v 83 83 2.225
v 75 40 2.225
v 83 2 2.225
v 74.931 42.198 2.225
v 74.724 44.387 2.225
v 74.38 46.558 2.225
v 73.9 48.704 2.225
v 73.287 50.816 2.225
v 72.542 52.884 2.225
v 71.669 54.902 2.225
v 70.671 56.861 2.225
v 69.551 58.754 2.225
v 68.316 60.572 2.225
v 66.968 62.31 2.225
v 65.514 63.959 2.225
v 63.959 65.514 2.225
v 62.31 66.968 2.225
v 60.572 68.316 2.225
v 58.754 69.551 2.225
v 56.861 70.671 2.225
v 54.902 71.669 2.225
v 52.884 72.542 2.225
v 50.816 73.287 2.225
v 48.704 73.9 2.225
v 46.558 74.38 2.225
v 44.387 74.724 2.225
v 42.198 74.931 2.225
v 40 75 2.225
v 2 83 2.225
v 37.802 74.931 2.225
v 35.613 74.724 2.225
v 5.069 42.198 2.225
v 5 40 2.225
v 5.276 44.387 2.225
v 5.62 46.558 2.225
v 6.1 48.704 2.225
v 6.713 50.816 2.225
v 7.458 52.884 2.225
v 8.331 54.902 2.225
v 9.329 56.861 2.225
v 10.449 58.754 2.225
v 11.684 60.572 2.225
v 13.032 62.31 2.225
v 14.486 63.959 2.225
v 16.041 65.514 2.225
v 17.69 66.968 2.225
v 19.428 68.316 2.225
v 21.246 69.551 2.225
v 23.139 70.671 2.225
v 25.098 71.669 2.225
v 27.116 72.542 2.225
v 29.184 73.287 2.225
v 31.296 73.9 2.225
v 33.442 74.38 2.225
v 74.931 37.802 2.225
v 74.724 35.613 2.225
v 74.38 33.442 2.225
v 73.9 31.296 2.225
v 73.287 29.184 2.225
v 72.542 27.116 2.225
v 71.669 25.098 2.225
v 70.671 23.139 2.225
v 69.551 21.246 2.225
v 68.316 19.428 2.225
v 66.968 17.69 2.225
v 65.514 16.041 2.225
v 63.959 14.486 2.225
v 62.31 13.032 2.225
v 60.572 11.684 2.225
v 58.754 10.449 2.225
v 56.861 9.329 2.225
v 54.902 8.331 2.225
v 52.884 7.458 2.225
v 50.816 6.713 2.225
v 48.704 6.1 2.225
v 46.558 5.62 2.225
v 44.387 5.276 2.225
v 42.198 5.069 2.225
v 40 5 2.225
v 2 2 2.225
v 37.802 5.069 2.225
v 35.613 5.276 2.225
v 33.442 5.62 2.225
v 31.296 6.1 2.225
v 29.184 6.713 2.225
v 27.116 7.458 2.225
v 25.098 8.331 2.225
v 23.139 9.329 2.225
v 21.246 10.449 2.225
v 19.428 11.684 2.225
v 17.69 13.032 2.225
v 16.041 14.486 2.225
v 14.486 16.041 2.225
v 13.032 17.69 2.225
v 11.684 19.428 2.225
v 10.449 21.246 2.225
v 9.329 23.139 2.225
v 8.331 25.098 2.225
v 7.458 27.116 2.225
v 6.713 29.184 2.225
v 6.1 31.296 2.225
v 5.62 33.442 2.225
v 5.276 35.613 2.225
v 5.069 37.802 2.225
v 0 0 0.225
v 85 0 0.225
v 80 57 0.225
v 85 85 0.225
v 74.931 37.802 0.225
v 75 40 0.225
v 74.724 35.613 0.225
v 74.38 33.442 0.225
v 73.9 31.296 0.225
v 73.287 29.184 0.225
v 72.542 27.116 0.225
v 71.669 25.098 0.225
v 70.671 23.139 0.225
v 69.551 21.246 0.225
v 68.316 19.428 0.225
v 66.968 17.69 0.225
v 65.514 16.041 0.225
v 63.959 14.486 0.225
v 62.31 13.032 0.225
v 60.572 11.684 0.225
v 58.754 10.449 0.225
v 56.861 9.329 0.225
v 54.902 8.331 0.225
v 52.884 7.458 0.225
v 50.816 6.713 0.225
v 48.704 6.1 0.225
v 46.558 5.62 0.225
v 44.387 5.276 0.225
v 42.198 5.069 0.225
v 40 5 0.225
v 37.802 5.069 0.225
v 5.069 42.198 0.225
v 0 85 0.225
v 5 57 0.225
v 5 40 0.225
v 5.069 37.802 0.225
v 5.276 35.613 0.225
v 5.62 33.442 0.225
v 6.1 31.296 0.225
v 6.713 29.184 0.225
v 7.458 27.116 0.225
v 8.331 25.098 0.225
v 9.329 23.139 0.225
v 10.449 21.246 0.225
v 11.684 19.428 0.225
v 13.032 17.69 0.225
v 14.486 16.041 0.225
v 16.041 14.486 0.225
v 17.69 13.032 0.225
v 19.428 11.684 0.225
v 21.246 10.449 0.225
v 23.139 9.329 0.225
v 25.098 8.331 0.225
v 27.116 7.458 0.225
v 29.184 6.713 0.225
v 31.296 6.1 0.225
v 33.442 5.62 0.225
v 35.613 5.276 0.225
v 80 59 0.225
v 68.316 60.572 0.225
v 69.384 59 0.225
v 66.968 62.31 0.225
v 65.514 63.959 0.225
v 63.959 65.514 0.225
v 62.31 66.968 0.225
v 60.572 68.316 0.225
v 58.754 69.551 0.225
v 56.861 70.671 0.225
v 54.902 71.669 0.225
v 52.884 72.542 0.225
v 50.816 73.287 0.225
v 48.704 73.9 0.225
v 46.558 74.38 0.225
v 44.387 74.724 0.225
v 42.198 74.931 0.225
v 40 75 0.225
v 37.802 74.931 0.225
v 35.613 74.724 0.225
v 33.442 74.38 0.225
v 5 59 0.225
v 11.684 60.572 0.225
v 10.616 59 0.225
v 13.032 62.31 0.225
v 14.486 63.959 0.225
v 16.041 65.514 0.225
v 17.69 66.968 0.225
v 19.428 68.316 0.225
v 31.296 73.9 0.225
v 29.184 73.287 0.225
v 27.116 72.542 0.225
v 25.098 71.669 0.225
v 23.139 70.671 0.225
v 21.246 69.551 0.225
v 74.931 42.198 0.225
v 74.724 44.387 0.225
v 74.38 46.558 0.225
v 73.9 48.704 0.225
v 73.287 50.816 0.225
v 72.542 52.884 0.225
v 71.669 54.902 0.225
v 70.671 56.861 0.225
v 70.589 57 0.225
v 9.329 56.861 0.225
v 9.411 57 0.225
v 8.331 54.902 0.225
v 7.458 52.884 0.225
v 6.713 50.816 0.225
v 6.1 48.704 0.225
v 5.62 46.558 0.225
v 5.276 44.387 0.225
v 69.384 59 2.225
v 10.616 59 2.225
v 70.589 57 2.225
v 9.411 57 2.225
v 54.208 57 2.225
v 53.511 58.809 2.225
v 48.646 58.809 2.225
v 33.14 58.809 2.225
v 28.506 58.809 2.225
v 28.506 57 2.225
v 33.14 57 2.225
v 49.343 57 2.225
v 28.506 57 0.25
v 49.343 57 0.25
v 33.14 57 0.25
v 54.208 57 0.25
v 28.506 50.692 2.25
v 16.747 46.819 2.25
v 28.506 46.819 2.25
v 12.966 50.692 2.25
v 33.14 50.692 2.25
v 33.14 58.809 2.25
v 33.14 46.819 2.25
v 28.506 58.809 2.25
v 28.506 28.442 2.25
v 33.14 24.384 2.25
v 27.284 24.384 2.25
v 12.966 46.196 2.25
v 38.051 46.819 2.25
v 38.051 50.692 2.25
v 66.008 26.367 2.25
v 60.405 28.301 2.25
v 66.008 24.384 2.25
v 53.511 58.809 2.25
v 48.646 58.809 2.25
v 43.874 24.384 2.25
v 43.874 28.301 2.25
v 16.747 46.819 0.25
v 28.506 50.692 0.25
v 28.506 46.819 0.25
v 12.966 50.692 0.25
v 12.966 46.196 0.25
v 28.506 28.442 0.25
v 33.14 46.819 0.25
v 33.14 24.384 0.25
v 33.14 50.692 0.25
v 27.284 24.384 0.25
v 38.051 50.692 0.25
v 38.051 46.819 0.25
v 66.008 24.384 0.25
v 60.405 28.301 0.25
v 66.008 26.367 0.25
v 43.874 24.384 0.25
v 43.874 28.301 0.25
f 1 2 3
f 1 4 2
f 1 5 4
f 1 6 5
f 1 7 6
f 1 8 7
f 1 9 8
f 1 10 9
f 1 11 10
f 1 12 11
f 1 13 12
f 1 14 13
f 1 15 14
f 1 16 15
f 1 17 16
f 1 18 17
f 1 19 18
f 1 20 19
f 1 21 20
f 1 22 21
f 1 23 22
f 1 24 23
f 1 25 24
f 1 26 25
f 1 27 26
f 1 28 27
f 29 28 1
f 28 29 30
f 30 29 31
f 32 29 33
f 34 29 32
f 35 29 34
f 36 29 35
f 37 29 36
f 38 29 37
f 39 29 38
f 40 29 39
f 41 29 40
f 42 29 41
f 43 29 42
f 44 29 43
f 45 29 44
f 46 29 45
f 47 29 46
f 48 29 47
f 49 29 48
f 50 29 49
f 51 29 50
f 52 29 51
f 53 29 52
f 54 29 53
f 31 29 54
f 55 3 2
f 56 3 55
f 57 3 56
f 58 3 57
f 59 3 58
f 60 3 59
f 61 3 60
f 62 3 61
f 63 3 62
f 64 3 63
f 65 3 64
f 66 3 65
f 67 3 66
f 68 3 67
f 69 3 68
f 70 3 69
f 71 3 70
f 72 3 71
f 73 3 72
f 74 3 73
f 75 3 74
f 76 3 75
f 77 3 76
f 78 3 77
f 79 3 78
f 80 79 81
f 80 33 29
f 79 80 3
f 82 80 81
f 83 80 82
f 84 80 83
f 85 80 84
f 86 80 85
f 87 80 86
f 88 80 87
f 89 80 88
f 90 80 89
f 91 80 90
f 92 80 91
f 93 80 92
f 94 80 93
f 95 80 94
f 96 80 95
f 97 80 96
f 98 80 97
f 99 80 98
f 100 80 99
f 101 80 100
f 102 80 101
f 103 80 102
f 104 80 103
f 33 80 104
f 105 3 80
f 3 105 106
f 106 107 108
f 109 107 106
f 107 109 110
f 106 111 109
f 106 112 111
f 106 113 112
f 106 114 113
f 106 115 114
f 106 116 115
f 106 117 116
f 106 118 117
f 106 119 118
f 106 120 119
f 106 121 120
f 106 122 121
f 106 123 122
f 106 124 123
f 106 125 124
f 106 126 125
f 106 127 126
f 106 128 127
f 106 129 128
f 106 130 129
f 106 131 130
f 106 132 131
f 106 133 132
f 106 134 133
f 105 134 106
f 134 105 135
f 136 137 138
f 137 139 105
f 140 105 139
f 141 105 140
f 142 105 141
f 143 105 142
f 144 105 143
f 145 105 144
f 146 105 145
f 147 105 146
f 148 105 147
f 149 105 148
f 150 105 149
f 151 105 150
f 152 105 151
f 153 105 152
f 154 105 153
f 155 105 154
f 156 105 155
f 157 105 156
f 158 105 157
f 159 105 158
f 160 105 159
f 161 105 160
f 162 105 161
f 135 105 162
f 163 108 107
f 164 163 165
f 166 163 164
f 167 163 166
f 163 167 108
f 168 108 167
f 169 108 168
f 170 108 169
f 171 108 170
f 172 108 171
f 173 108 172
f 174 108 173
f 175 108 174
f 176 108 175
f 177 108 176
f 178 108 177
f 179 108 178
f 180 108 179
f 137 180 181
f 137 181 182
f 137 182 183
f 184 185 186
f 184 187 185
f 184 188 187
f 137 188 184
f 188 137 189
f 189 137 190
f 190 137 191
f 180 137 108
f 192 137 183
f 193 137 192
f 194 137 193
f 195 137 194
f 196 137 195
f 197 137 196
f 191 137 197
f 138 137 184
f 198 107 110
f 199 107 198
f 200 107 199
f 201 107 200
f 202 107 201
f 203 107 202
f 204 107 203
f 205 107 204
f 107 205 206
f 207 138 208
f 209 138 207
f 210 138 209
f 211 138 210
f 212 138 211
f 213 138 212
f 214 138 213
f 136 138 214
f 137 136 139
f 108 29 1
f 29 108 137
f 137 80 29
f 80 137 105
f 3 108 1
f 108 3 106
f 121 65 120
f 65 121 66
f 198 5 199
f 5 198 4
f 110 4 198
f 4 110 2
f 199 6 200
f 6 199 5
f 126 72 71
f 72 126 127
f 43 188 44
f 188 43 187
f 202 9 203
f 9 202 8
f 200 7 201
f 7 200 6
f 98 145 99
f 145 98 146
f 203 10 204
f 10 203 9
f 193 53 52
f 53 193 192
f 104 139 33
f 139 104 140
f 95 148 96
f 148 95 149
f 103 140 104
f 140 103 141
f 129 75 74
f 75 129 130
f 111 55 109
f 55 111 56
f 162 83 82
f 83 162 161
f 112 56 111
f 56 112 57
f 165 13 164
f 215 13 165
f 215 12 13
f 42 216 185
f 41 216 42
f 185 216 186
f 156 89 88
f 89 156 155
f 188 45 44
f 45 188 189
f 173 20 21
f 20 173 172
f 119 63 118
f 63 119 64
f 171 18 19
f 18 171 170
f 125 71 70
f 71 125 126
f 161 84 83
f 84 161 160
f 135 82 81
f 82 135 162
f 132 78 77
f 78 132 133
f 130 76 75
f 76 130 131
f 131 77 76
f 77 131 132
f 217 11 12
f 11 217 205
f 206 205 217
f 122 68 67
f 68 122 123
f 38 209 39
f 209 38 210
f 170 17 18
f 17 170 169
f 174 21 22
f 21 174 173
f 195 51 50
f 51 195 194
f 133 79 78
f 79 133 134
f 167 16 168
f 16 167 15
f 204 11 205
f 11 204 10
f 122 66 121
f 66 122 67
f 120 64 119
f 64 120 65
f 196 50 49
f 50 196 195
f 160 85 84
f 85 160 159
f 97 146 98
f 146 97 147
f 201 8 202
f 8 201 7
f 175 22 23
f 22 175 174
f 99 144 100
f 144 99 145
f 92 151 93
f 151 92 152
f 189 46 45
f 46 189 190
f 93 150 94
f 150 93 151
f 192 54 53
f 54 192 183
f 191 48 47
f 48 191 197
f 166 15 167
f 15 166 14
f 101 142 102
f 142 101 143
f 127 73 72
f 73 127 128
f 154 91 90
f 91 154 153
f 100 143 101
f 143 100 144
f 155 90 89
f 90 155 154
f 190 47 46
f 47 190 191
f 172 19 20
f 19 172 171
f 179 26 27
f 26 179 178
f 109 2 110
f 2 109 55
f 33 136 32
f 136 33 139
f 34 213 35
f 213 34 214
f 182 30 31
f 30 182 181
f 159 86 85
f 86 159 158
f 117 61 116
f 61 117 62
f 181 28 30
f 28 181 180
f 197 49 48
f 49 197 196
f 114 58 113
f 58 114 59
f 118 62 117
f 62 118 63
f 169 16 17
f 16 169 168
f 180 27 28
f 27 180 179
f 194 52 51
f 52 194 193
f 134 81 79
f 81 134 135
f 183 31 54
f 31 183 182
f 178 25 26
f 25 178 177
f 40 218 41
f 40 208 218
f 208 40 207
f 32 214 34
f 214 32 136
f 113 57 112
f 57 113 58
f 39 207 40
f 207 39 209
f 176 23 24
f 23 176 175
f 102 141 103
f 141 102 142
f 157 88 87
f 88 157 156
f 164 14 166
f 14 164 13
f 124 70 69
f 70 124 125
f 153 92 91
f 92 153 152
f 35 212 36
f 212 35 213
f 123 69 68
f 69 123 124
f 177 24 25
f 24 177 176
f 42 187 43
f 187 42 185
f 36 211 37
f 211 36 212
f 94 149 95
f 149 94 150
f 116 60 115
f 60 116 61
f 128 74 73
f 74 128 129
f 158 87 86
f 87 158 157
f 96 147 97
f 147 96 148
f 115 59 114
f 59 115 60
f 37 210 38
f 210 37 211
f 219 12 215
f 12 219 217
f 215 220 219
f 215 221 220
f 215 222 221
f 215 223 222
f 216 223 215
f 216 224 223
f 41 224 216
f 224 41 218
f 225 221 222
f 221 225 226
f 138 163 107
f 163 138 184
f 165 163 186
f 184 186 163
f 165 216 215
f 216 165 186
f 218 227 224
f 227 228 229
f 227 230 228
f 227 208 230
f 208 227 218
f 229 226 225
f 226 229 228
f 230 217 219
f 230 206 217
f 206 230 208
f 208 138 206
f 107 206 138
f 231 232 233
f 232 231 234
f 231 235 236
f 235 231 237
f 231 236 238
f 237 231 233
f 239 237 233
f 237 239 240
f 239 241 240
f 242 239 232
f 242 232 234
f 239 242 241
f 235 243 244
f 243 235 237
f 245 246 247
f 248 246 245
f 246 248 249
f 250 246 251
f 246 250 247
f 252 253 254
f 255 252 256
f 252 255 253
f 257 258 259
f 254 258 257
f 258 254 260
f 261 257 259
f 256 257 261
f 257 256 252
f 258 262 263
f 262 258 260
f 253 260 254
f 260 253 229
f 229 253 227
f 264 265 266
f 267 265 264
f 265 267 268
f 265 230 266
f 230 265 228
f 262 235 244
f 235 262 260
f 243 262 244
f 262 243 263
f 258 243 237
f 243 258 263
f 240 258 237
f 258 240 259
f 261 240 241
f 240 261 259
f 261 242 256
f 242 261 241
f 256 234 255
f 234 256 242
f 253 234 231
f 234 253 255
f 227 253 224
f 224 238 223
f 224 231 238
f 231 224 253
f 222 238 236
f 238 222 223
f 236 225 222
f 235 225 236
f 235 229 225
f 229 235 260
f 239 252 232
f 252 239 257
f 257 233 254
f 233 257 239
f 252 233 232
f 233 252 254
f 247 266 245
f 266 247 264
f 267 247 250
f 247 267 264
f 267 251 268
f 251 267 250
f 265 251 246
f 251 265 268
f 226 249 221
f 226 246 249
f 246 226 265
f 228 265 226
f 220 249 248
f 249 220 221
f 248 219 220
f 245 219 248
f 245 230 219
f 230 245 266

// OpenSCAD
//use numeric variable to move the bar up and down 

//enter the anniversary (2 digit)
text_box = "47";
module plate(scale) {polyhedron(
 points=[[83.00000000000014,2.000000000000113,2.2250053518819857],[2.0000000000002305,83.00000000000033,2.2250053518820816],[2.0000000000000075,2.0000000000002256,2.22500535188211],[2.0000000000002305,83.00000000000033,2.2250053518820816],[83.00000000000014,2.000000000000113,2.2250053518819857],[83.00000000000034,83.00000000000026,2.225005351882025],[85.00000000000024,1.3535839116229907e-13,0.22500535188194992],[2.0000000000000075,2.0000000000002256,2.22500535188211],[0.0,0.0,0.22500535188208526],[2.0000000000000075,2.0000000000002256,2.22500535188211],[85.00000000000024,1.3535839116229907e-13,0.22500535188194992],[83.00000000000014,2.000000000000113,2.2250053518819857],[2.425171174991192e-13,85.00000000000037,0.22500535188207962],[85.00000000000024,1.3535839116229907e-13,0.22500535188194992],[0.0,0.0,0.22500535188208526],[85.00000000000024,1.3535839116229907e-13,0.22500535188194992],[2.425171174991192e-13,85.00000000000037,0.22500535188207962],[85.00000000000048,85.00000000000027,0.22500535188197246],[2.0000000000002305,83.00000000000033,2.2250053518820816],[85.00000000000048,85.00000000000027,0.22500535188197246],[2.425171174991192e-13,85.00000000000037,0.22500535188207962],[85.00000000000048,85.00000000000027,0.22500535188197246],[2.0000000000002305,83.00000000000033,2.2250053518820816],[83.00000000000034,83.00000000000026,2.225005351882025],[2.0000000000000075,2.0000000000002256,2.22500535188211],[2.425171174991192e-13,85.00000000000037,0.22500535188207962],[0.0,0.0,0.22500535188208526],[2.425171174991192e-13,85.00000000000037,0.22500535188207962],[2.0000000000000075,2.0000000000002256,2.22500535188211],[2.0000000000002305,83.00000000000033,2.2250053518820816],[85.00000000000024,1.3535839116229907e-13,0.22500535188194992],[83.00000000000034,83.00000000000026,2.225005351882025],[83.00000000000014,2.000000000000113,2.2250053518819857],[83.00000000000034,83.00000000000026,2.225005351882025],[85.00000000000024,1.3535839116229907e-13,0.22500535188194992],[85.00000000000048,85.00000000000027,0.22500535188197246] ],
faces=[[0,1,2],[3,4,5],[6,7,8],[9,10,11],[12,13,14],[15,16,17],[18,19,20],[21,22,23],[24,25,26],[27,28,29],[30,31,32],[33,34,35]]);}





difference(1) {
plate(1);
translate ([40,40,0])
cylinder (h = 12, r=35, center = true, $fn=100);
}
translate ([5,57,.225])
cube([75,2,2] );

// text(scale) {
font1 = "Archivo Black"; // here you can select other font type
content = (str(text_box));

translate ([40,42,2.25]) {
rotate ([180,0,0]) {
linear_extrude(height = 2) {
text(content, font = font1, size = 34, halign="center", valign="center", direction = "ltr", spacing = 1 );
    ;
}
}
}

